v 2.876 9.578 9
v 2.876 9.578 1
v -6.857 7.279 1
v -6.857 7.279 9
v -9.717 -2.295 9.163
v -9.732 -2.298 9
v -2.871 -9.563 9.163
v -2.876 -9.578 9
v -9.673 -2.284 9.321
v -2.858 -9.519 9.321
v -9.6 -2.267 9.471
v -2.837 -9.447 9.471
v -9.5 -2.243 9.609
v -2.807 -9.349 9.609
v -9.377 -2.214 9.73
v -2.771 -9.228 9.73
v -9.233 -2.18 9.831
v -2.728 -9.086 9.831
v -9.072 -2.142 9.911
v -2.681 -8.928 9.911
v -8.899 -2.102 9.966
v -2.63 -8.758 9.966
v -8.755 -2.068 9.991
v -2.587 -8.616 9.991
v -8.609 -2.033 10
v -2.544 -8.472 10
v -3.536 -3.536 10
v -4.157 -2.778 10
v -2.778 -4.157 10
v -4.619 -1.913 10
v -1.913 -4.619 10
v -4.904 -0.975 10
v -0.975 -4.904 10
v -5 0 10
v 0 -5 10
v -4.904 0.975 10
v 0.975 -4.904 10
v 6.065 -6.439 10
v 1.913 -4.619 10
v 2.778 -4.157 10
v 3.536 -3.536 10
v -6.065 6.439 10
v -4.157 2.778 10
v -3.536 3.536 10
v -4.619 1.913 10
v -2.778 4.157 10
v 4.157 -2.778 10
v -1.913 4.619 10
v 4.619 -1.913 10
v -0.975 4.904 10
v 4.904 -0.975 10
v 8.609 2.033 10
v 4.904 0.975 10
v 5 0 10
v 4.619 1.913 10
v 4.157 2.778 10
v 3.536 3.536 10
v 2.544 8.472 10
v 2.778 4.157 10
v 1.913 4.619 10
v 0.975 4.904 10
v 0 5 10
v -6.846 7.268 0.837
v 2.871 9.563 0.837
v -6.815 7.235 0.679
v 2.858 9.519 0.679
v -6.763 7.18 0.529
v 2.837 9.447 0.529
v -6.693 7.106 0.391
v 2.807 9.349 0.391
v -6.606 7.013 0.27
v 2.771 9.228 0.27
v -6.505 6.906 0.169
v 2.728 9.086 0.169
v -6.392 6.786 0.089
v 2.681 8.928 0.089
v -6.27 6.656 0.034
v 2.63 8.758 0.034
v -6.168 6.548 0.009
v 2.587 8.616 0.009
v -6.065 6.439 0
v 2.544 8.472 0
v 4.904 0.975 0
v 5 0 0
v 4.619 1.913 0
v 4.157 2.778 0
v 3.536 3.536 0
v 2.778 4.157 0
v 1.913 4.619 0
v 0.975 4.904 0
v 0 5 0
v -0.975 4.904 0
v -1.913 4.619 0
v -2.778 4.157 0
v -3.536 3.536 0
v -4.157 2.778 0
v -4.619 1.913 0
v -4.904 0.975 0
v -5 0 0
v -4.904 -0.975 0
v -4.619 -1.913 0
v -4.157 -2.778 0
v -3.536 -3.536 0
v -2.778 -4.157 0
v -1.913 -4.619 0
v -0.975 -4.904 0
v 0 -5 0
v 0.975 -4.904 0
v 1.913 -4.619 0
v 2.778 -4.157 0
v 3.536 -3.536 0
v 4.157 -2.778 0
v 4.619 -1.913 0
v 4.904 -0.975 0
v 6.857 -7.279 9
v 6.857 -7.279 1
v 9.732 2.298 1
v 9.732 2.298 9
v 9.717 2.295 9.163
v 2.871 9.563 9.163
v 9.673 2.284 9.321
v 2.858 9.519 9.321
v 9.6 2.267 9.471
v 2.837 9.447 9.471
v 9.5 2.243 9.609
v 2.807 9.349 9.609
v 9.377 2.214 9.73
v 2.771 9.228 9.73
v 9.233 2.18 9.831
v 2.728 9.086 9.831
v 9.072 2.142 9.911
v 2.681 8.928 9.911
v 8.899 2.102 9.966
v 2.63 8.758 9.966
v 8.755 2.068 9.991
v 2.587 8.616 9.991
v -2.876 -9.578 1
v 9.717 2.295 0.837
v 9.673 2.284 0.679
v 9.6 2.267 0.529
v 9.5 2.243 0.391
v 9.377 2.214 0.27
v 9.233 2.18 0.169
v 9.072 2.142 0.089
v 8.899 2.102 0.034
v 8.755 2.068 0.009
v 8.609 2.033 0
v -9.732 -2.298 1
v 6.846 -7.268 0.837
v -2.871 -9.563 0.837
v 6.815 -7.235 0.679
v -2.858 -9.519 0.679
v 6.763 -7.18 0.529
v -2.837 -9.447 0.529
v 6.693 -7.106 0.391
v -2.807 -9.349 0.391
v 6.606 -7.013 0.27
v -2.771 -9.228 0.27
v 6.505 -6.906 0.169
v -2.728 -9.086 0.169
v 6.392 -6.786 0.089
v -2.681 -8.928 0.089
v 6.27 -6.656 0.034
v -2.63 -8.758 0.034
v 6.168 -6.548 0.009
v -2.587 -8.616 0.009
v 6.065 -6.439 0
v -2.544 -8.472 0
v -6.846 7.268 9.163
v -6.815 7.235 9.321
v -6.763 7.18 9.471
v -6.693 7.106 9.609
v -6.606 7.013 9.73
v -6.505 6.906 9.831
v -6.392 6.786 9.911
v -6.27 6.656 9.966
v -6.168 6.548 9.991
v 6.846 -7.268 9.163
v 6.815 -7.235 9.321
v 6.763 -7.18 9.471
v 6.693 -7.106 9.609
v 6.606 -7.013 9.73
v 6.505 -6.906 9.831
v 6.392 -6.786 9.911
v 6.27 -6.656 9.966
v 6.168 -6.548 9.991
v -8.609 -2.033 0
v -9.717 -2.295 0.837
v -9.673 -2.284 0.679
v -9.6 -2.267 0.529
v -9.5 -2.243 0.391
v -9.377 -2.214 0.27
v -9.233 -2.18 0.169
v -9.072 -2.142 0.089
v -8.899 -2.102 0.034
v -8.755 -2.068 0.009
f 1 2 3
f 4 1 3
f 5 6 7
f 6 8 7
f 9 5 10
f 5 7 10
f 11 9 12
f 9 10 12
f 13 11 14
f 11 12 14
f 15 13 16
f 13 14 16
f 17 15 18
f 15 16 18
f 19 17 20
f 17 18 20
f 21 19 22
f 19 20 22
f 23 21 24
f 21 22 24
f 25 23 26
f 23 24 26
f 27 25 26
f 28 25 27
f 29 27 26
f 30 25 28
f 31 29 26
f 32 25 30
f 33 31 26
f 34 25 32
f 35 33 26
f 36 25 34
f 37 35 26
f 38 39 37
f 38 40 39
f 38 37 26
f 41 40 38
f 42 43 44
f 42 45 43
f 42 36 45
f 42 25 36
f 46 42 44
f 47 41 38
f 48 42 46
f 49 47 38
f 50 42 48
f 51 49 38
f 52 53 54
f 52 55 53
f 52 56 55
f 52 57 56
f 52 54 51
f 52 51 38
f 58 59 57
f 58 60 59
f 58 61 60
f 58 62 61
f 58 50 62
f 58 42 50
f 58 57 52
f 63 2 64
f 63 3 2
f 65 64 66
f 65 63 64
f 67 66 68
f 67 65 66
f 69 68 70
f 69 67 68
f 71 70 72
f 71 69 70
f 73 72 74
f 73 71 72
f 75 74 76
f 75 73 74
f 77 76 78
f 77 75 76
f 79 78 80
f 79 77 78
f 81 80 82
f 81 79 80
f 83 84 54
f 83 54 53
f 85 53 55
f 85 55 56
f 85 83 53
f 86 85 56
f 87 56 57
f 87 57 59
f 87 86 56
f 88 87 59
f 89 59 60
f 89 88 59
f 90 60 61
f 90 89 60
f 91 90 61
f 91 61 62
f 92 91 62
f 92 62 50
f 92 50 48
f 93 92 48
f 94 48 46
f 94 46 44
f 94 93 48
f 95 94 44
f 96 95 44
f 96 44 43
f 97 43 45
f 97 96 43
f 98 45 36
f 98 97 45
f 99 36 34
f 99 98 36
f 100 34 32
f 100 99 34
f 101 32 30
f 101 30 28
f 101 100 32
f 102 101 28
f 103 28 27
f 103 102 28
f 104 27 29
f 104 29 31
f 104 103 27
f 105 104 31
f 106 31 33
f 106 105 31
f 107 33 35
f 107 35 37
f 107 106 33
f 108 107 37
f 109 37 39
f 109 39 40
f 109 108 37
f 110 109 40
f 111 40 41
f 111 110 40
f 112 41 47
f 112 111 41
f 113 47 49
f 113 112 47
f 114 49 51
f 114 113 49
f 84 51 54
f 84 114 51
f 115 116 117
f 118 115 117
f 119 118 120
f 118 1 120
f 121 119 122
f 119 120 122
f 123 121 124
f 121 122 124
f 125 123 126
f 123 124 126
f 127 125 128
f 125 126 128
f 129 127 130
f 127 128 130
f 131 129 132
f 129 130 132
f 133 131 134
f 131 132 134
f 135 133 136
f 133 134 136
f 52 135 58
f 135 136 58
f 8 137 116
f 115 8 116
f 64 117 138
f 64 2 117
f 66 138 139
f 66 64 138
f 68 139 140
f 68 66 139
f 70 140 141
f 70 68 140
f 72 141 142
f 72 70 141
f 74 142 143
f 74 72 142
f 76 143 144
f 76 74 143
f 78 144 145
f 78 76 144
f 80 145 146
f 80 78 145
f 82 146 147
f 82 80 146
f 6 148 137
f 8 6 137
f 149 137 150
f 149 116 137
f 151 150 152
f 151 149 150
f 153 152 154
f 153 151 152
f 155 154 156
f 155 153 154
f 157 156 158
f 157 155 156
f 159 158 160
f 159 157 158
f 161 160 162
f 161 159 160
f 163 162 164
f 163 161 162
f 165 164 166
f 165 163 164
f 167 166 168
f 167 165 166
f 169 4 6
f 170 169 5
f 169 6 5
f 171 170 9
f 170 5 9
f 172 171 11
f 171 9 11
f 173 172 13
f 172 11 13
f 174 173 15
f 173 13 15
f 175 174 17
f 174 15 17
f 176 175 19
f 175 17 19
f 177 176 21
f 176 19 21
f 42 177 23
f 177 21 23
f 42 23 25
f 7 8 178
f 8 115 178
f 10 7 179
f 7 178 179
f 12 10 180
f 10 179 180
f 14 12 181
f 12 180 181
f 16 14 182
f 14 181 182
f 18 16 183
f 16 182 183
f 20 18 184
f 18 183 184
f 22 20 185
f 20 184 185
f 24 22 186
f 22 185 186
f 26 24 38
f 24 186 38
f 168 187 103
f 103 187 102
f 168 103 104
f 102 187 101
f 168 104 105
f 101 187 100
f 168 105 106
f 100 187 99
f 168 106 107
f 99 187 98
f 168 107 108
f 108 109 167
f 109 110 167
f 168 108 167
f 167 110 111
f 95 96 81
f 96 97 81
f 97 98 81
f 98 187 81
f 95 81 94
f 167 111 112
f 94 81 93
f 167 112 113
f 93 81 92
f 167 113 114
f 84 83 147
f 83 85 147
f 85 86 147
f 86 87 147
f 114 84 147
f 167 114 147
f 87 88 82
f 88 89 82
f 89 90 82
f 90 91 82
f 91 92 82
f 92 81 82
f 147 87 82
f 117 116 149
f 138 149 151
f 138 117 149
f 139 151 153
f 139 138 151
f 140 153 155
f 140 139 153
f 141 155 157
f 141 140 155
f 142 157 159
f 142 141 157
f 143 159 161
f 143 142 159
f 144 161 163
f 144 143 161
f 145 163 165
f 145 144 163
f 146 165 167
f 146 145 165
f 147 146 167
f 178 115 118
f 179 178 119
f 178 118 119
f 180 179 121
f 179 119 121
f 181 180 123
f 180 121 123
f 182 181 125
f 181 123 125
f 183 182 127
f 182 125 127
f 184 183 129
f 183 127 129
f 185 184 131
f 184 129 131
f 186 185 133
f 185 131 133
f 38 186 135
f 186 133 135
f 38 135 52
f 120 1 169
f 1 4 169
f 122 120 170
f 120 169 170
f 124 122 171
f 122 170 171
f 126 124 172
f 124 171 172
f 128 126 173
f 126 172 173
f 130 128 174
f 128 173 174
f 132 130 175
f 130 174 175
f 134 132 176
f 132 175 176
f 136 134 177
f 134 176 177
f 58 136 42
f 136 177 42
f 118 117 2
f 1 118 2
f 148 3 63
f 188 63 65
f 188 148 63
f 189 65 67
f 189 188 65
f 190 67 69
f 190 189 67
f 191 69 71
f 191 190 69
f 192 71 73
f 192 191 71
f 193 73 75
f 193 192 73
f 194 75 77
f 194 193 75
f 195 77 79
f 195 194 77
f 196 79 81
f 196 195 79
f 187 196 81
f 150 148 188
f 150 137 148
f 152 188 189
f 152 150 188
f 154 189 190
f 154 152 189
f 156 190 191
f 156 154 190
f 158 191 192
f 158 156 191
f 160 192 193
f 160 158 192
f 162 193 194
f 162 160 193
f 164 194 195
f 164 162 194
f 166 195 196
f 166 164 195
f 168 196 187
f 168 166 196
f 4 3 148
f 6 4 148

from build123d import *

# Parameters (mm, degrees)
SKETCH_1_R      = 5
EXTRUDE_1_DEPTH = 10
FILLET_1_R      = 1


with BuildPart() as part:
    # Эскиз1 → Вытянуть1 (new body)
    with BuildSketch(Plane.XY):
        Polygon((9.732299753, 2.298334508), (2.875733806, 9.577586078), (-6.856565947, 7.27925157), (-9.732299753, -2.298334508), (-2.875733806, -9.577586078), (6.856565947, -7.27925157), align=None)
        Circle(SKETCH_1_R, mode=Mode.SUBTRACT)
    extrude(amount=EXTRUDE_1_DEPTH)

    # Скругление1
    fillet_1_edges = [part.edges().sort_by_distance(p)[0] for p in [
        (-1.99041607, 8.428418824, 10),
        (-8.29443285, 2.490458531, 10),
        (-6.30401678, -5.937960293, 10),
        (1.99041607, -8.428418824, 10),
        (8.29443285, -2.490458531, 10),
        (1.99041607, -8.428418824, 0),
        (-6.30401678, -5.937960293, 0),
        (-8.29443285, 2.490458531, 0),
        (6.30401678, 5.937960293, 10),
        (-1.99041607, 8.428418824, 0),
        (6.30401678, 5.937960293, 0),
        (8.29443285, -2.490458531, 0),
    ]]
    fillet(fillet_1_edges, radius=FILLET_1_R)


solid = part.part
